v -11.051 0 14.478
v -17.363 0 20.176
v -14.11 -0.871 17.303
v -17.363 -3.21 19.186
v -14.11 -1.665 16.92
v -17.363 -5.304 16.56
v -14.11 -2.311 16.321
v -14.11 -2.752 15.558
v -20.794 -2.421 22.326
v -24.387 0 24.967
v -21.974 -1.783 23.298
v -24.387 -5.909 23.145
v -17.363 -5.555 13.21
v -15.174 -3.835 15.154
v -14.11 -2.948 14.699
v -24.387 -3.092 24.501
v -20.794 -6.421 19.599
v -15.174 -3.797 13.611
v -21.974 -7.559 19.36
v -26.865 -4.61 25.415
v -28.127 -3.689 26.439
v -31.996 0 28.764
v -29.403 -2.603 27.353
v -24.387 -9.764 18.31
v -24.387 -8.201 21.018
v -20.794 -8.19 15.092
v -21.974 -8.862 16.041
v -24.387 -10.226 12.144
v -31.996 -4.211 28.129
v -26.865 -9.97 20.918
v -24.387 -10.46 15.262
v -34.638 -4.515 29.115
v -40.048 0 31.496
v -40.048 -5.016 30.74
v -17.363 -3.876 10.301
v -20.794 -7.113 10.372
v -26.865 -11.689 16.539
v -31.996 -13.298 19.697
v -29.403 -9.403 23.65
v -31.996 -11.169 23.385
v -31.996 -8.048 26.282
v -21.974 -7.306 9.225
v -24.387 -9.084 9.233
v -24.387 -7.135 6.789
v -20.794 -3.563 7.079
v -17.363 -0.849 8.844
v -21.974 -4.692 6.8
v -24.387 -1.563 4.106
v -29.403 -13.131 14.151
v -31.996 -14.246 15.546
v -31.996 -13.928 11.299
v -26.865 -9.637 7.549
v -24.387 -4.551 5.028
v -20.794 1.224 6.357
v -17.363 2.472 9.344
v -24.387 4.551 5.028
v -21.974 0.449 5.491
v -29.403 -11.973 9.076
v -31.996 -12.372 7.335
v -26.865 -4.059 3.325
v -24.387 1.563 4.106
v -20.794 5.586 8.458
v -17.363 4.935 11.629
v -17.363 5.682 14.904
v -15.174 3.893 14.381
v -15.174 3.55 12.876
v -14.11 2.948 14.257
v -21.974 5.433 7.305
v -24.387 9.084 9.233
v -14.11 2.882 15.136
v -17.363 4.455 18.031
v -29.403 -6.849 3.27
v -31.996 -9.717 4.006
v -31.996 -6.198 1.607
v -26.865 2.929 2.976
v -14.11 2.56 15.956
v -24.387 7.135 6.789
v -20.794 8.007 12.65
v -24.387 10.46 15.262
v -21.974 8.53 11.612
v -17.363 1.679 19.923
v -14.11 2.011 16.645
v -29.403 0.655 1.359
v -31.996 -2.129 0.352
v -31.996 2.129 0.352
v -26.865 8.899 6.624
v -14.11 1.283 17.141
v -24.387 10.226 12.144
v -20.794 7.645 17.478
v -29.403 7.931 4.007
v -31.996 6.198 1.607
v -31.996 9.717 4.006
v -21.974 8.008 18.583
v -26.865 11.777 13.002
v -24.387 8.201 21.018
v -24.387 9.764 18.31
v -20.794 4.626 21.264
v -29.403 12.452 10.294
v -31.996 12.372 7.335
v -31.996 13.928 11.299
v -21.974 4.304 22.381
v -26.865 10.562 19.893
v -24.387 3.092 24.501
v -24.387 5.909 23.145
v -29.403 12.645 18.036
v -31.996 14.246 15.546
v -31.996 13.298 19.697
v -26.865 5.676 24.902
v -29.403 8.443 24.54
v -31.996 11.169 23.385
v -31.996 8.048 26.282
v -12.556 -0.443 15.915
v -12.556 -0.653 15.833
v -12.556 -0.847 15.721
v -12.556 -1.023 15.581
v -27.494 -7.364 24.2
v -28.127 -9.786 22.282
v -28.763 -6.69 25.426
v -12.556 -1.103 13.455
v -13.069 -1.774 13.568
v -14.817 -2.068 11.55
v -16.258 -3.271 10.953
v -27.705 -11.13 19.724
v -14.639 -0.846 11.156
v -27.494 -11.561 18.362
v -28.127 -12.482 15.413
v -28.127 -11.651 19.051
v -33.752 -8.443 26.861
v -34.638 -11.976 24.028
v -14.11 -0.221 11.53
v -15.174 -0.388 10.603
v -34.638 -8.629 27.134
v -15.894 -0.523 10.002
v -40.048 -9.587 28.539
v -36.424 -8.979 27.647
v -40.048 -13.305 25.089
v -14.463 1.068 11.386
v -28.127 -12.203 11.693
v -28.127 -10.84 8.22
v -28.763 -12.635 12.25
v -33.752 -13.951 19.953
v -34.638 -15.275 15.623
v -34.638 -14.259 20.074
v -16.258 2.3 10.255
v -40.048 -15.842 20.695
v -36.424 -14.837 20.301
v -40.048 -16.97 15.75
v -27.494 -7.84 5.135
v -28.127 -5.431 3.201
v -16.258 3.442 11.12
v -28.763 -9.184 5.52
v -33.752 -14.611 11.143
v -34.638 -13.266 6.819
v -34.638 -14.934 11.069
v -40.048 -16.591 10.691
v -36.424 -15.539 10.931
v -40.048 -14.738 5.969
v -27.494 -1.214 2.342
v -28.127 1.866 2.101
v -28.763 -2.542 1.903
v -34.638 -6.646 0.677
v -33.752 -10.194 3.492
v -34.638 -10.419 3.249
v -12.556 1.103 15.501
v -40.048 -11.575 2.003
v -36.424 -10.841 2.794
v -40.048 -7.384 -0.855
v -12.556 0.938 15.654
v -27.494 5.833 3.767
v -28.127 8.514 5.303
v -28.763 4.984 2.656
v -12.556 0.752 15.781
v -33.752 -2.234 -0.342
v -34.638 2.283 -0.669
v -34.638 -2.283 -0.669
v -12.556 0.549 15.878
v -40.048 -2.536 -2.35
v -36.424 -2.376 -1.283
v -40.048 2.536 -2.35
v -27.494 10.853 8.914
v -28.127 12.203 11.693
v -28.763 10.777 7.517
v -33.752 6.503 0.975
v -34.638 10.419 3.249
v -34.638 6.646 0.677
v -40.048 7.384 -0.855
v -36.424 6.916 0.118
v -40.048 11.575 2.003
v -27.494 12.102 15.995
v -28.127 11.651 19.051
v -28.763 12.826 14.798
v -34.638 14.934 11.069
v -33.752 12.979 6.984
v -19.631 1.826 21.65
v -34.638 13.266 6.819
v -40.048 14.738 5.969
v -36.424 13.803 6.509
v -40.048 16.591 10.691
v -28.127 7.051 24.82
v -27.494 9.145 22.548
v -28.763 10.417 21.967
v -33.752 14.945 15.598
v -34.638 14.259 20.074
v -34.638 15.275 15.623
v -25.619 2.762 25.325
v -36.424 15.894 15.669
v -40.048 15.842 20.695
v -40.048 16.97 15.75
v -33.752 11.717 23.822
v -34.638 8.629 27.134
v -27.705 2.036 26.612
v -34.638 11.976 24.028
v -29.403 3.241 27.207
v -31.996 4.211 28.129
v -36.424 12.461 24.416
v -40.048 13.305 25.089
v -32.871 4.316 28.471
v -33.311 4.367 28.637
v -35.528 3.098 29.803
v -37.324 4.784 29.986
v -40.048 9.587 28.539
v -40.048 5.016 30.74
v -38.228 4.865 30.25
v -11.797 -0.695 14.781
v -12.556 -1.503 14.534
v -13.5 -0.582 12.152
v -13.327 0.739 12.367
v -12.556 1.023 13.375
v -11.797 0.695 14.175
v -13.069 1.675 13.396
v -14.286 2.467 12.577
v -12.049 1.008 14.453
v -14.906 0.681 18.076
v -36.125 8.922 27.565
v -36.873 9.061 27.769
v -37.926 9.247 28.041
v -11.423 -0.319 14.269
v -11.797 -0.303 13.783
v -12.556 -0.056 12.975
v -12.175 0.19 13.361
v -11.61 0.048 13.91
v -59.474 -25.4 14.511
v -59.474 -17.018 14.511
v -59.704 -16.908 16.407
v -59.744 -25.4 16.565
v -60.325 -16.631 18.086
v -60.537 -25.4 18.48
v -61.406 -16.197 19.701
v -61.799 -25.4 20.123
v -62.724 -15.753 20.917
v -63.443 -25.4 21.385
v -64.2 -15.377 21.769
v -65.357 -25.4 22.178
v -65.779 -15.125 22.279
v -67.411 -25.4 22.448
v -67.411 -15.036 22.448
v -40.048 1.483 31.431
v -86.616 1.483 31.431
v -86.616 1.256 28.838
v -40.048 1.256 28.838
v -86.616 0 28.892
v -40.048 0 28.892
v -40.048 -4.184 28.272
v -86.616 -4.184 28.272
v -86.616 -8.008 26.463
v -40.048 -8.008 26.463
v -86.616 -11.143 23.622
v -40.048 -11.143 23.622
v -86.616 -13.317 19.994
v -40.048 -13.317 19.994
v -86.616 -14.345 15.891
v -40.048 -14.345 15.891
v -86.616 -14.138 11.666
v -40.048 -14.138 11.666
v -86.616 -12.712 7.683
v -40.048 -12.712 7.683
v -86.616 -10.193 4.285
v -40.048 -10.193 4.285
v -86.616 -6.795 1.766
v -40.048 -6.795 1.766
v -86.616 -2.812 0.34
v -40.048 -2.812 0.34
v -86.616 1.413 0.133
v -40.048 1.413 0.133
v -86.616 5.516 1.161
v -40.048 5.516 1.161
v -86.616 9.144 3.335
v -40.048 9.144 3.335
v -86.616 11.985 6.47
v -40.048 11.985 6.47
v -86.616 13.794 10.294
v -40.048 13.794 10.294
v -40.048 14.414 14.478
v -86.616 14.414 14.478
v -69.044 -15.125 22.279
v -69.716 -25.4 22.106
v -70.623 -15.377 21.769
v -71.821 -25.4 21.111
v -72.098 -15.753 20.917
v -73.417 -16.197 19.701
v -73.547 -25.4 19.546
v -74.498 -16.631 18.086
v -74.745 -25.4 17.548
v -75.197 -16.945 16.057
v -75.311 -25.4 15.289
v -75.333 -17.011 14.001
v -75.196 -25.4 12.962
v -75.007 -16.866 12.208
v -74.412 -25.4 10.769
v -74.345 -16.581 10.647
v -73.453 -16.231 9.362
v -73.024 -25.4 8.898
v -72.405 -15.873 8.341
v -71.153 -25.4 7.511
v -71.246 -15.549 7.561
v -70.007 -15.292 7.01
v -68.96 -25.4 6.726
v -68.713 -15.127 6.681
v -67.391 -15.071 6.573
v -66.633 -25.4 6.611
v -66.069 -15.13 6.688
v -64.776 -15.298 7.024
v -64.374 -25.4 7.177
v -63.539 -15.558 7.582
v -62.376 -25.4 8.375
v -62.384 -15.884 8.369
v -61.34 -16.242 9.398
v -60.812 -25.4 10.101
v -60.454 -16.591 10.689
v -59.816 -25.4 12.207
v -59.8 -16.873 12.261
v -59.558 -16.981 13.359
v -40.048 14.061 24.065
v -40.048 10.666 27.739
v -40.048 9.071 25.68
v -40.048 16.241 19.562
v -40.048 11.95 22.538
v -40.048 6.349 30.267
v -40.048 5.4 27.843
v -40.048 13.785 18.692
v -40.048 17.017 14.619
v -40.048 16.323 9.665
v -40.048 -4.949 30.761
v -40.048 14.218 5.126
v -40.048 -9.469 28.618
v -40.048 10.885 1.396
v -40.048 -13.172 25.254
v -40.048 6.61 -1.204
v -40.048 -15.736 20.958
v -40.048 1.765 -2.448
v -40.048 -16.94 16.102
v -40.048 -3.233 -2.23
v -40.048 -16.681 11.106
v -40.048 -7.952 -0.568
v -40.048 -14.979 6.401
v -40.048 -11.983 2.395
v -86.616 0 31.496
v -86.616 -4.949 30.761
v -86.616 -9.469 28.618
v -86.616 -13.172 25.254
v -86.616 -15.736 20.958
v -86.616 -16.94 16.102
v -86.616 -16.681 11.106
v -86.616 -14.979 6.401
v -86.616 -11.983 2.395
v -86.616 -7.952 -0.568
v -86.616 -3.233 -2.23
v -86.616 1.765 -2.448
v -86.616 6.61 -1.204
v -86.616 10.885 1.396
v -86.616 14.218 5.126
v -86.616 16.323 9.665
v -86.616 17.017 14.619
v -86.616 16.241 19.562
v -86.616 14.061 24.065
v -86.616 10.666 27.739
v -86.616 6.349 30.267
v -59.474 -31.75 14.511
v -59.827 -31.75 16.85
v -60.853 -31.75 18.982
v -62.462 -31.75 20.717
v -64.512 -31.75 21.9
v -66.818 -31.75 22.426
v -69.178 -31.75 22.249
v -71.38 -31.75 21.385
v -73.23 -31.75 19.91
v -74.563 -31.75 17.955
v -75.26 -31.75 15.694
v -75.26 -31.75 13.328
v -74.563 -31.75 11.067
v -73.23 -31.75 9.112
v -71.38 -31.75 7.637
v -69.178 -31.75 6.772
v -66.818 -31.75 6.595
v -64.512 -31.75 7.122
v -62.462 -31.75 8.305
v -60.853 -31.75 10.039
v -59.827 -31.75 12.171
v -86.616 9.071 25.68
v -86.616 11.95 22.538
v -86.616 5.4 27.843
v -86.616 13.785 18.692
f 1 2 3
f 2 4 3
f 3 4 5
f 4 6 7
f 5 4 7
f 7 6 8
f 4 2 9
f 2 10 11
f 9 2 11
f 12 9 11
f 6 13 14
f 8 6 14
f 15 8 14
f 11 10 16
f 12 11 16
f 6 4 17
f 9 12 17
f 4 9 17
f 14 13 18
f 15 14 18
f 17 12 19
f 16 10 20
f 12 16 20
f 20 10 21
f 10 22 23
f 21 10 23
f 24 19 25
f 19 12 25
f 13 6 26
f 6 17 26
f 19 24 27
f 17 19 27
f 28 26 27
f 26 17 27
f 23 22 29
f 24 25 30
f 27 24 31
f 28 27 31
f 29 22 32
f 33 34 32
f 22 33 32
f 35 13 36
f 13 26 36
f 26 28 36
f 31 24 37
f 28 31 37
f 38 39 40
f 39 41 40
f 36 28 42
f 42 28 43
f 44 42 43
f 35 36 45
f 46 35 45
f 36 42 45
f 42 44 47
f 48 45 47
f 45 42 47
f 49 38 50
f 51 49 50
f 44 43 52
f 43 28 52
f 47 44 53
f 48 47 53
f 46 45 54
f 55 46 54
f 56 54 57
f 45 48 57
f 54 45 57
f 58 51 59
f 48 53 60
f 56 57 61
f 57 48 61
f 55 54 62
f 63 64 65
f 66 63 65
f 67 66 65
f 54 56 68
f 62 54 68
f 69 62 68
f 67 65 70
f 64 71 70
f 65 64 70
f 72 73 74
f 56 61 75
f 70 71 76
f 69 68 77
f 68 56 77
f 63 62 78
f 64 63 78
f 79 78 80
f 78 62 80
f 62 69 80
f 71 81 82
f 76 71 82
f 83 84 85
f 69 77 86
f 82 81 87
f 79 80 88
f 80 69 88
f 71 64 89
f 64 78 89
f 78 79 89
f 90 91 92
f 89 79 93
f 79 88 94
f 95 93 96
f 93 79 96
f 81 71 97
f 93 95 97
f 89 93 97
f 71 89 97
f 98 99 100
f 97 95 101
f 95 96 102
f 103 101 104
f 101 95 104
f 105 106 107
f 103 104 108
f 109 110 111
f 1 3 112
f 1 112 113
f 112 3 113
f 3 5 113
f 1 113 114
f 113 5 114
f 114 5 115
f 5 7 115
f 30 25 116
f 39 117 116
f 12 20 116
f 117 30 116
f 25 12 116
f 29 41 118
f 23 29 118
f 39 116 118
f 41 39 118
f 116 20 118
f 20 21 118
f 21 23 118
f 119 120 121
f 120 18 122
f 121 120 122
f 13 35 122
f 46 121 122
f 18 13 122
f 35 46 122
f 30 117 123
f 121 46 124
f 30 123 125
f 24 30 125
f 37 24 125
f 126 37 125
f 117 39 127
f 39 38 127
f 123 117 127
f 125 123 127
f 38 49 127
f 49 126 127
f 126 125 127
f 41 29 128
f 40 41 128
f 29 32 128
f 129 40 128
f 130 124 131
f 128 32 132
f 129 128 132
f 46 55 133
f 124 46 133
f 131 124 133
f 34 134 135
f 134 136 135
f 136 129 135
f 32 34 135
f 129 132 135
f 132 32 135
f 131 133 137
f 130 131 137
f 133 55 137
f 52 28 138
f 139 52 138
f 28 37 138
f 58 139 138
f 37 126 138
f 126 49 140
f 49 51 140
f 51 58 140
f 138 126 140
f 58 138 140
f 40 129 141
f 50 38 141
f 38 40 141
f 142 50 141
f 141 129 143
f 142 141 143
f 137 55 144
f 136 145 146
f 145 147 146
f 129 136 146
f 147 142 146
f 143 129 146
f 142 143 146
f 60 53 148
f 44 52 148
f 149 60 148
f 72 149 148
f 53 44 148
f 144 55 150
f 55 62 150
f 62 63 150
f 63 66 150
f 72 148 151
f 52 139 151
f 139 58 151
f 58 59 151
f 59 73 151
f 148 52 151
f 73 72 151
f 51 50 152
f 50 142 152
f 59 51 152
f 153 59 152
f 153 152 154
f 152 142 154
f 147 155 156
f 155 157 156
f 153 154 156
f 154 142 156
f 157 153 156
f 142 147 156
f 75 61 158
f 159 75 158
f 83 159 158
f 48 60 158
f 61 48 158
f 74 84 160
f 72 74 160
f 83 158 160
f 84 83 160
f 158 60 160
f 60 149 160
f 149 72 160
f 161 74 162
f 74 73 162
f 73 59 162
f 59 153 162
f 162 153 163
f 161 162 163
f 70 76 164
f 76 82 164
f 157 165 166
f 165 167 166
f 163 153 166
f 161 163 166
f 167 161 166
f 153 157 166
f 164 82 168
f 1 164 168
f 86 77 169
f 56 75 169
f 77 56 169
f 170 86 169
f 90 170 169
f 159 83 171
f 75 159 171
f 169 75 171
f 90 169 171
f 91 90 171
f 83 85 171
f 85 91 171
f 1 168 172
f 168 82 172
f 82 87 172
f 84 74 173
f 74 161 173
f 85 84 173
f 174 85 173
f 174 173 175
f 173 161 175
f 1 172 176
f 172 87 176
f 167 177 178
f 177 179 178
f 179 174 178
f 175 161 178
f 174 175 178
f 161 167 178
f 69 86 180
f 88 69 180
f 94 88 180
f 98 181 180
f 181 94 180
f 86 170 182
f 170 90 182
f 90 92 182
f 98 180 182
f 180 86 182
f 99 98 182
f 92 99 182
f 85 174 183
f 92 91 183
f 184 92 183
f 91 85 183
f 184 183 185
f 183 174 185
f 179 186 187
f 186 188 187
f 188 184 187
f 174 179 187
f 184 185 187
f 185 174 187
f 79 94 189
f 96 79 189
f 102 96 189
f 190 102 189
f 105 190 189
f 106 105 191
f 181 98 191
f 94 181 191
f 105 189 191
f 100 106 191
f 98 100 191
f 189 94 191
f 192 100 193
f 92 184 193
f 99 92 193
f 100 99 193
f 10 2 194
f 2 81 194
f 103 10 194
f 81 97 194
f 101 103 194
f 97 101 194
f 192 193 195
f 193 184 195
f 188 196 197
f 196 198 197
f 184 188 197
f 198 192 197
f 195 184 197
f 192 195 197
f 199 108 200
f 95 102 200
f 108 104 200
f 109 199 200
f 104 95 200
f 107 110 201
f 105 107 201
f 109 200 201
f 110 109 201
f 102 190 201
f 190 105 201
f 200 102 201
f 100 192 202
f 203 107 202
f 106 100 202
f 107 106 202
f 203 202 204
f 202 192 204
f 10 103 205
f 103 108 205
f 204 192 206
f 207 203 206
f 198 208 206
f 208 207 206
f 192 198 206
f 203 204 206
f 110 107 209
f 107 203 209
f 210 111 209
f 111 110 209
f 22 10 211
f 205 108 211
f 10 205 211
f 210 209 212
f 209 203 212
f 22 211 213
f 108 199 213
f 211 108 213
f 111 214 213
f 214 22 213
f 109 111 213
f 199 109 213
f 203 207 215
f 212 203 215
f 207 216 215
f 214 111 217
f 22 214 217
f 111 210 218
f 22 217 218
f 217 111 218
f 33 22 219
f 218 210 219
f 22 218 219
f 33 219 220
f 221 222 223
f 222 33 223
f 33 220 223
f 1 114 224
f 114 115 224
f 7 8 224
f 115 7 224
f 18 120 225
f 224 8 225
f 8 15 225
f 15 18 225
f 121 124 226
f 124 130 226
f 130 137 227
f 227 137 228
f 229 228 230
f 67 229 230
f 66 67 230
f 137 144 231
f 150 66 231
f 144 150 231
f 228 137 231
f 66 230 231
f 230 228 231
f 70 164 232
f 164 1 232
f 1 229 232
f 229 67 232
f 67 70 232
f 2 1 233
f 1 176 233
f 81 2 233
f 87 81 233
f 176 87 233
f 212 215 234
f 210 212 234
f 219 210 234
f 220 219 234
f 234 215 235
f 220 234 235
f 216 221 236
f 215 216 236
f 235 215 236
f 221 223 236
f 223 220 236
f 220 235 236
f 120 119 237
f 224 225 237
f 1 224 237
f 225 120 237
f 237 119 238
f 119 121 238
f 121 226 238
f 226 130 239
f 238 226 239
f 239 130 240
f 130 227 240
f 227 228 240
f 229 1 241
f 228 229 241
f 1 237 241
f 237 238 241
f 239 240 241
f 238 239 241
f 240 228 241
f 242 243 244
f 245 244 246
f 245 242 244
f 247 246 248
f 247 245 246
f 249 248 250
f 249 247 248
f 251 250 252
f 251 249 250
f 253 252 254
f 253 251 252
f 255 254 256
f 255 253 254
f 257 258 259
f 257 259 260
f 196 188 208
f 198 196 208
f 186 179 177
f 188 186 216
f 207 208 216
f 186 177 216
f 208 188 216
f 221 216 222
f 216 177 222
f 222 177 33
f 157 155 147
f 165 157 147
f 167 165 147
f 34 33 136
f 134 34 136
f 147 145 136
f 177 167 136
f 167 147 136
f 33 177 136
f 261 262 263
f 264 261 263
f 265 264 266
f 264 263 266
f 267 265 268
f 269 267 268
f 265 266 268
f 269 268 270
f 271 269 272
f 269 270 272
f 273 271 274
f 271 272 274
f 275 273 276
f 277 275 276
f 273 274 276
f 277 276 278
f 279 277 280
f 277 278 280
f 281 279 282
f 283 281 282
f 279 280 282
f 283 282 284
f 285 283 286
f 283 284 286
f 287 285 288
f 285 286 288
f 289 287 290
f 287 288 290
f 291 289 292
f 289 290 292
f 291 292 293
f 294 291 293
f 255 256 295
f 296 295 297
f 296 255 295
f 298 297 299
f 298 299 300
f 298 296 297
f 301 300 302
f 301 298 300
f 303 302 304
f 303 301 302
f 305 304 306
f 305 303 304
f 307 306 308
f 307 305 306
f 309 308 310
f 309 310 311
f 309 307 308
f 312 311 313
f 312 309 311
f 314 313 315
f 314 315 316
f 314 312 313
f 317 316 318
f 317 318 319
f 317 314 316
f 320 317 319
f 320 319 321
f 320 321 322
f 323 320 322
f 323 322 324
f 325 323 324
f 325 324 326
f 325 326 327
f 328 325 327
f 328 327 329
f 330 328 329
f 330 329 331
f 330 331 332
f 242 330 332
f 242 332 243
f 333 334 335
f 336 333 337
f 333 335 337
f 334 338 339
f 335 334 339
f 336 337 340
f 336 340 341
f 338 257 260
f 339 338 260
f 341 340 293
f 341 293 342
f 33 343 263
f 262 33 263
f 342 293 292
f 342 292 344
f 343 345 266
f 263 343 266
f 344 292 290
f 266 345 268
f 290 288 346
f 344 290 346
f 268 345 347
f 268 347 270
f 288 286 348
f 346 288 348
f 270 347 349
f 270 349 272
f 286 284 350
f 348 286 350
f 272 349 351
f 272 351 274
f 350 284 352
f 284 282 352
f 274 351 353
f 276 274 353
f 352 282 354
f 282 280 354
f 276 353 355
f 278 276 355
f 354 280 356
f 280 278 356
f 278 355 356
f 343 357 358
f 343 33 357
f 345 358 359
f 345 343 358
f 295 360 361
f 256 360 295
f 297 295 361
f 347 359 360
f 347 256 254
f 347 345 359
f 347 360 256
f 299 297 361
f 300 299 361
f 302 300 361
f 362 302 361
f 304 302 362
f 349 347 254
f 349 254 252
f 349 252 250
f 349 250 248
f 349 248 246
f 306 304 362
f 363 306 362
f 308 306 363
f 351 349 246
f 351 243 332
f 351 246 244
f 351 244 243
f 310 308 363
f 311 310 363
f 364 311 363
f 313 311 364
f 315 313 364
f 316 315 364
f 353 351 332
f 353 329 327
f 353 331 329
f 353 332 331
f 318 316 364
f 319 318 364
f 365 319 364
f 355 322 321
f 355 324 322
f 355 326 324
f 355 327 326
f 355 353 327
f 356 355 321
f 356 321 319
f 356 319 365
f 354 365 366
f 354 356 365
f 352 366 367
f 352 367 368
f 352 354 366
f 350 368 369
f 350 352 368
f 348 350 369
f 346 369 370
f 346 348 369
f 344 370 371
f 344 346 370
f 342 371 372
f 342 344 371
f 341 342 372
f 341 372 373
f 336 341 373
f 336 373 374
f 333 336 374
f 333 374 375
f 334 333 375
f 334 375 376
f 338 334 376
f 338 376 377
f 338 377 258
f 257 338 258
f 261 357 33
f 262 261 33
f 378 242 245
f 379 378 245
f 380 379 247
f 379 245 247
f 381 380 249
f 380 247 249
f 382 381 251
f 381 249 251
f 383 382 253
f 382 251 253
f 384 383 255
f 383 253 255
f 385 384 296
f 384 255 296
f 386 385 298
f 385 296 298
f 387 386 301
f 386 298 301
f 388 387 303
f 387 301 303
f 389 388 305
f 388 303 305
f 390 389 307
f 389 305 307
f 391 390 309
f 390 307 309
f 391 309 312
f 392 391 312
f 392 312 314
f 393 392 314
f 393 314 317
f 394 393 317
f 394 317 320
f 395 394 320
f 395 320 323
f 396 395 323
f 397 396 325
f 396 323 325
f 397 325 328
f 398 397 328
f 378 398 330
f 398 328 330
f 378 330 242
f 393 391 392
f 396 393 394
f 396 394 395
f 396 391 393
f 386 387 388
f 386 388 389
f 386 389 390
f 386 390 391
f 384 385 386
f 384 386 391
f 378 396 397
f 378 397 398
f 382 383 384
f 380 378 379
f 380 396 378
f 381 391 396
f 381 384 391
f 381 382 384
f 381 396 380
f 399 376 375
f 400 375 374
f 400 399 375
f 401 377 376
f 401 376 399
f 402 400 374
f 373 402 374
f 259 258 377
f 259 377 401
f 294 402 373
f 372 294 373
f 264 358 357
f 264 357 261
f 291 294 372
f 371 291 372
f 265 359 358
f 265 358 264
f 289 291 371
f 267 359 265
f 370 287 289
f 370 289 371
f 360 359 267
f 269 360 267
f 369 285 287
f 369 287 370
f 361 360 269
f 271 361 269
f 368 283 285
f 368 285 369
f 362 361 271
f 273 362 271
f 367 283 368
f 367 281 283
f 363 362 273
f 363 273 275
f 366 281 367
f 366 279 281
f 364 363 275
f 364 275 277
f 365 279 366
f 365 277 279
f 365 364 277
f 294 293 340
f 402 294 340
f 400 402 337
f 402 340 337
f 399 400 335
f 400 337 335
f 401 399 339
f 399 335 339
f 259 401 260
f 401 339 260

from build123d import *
from build123d import SkipClean  # not in build123d's __all__

# Parameters (mm, degrees)
F0_W     = 46.5685683415
F0_H     = 17.018
F1_ANGLE = 355
F3_D     = 28.829
F3_DEPTH = 50.8
F3_TIP   = 8.661105393
F8_R     = 7.9375
F9_DEPTH = 6.35


with BuildPart() as f1:
    # F0 (on Front) → F1 (revolve)
    with BuildSketch(Plane.XZ):
        with Locations((-63.3321542538, 22.987)):
            Rectangle(F0_W, F0_H)
    revolve(axis=Axis((-48.8339384246, 0, 14.478), (1, 0, 0)), revolution_arc=F1_ANGLE)

    # F3
    with Locations(Plane(origin=(-86.6164384246, 0, 0), x_dir=(0, -1, 0), z_dir=(-1, 0, 0))):
        with Locations((0, 14.478)):
            Hole(F3_D / 2, depth=F3_DEPTH)
            with Locations((0, 0, -(F3_DEPTH + F3_TIP / 2))):  # 118° drill point
                Cone(0, F3_D / 2, F3_TIP, mode=Mode.SUBTRACT)

    # F6 (on offset) → F7 (join, up to the next surface of F1)
    with BuildSketch(Plane.XZ.offset(25.4)):
        with BuildLine():
            Line((-67.4114227295, 14.5107703283), (-59.4739227295, 14.5107703283))
            ThreePointArc((-59.4739227295, 14.5107703283), (-61.7987626538, 20.123430404), (-67.4114227295, 22.4482703283))
            Line((-67.4114227295, 22.4482703283), (-67.4114227295, 14.5107703283))
        make_face()
        with BuildLine():
            ThreePointArc((-67.4114227295, 22.4482703283), (-73.0240828052, 8.8981102527), (-59.4739227295, 14.5107703283))
            Line((-59.4739227295, 14.5107703283), (-67.4114227295, 14.5107703283))
            Line((-67.4114227295, 14.5107703283), (-67.4114227295, 22.4482703283))
        make_face()
    extrude(until=Until.NEXT, dir=(0, 1, 0))

    # F8 (on face) → F9 (join)
    with BuildSketch(Plane.XZ.offset(25.4)):
        with Locations((-67.4114227295, 14.5107703283)):
            Circle(F8_R)
    with SkipClean():  # cleaning this boolean's faces spoils the solid; the shape is the same uncleaned
        extrude(amount=F9_DEPTH)


with BuildPart() as f4:
    # F0 (on Front) → F4 (revolve)
    with BuildSketch(Plane.XZ):
        with BuildLine():
            ThreePointArc((-11.0514384246, 14.478), (-24.3874453928, 24.9672508998), (-40.0478700831, 31.496))
            Line((-40.0478700831, 31.496), (-40.0478700831, 14.478))
            Line((-40.0478700831, 14.478), (-11.0514384246, 14.478))
        make_face()
    revolve(axis=Axis((-48.8339384246, 0, 14.478), (1, 0, 0)))


solid = Compound([f1.part, f4.part])
